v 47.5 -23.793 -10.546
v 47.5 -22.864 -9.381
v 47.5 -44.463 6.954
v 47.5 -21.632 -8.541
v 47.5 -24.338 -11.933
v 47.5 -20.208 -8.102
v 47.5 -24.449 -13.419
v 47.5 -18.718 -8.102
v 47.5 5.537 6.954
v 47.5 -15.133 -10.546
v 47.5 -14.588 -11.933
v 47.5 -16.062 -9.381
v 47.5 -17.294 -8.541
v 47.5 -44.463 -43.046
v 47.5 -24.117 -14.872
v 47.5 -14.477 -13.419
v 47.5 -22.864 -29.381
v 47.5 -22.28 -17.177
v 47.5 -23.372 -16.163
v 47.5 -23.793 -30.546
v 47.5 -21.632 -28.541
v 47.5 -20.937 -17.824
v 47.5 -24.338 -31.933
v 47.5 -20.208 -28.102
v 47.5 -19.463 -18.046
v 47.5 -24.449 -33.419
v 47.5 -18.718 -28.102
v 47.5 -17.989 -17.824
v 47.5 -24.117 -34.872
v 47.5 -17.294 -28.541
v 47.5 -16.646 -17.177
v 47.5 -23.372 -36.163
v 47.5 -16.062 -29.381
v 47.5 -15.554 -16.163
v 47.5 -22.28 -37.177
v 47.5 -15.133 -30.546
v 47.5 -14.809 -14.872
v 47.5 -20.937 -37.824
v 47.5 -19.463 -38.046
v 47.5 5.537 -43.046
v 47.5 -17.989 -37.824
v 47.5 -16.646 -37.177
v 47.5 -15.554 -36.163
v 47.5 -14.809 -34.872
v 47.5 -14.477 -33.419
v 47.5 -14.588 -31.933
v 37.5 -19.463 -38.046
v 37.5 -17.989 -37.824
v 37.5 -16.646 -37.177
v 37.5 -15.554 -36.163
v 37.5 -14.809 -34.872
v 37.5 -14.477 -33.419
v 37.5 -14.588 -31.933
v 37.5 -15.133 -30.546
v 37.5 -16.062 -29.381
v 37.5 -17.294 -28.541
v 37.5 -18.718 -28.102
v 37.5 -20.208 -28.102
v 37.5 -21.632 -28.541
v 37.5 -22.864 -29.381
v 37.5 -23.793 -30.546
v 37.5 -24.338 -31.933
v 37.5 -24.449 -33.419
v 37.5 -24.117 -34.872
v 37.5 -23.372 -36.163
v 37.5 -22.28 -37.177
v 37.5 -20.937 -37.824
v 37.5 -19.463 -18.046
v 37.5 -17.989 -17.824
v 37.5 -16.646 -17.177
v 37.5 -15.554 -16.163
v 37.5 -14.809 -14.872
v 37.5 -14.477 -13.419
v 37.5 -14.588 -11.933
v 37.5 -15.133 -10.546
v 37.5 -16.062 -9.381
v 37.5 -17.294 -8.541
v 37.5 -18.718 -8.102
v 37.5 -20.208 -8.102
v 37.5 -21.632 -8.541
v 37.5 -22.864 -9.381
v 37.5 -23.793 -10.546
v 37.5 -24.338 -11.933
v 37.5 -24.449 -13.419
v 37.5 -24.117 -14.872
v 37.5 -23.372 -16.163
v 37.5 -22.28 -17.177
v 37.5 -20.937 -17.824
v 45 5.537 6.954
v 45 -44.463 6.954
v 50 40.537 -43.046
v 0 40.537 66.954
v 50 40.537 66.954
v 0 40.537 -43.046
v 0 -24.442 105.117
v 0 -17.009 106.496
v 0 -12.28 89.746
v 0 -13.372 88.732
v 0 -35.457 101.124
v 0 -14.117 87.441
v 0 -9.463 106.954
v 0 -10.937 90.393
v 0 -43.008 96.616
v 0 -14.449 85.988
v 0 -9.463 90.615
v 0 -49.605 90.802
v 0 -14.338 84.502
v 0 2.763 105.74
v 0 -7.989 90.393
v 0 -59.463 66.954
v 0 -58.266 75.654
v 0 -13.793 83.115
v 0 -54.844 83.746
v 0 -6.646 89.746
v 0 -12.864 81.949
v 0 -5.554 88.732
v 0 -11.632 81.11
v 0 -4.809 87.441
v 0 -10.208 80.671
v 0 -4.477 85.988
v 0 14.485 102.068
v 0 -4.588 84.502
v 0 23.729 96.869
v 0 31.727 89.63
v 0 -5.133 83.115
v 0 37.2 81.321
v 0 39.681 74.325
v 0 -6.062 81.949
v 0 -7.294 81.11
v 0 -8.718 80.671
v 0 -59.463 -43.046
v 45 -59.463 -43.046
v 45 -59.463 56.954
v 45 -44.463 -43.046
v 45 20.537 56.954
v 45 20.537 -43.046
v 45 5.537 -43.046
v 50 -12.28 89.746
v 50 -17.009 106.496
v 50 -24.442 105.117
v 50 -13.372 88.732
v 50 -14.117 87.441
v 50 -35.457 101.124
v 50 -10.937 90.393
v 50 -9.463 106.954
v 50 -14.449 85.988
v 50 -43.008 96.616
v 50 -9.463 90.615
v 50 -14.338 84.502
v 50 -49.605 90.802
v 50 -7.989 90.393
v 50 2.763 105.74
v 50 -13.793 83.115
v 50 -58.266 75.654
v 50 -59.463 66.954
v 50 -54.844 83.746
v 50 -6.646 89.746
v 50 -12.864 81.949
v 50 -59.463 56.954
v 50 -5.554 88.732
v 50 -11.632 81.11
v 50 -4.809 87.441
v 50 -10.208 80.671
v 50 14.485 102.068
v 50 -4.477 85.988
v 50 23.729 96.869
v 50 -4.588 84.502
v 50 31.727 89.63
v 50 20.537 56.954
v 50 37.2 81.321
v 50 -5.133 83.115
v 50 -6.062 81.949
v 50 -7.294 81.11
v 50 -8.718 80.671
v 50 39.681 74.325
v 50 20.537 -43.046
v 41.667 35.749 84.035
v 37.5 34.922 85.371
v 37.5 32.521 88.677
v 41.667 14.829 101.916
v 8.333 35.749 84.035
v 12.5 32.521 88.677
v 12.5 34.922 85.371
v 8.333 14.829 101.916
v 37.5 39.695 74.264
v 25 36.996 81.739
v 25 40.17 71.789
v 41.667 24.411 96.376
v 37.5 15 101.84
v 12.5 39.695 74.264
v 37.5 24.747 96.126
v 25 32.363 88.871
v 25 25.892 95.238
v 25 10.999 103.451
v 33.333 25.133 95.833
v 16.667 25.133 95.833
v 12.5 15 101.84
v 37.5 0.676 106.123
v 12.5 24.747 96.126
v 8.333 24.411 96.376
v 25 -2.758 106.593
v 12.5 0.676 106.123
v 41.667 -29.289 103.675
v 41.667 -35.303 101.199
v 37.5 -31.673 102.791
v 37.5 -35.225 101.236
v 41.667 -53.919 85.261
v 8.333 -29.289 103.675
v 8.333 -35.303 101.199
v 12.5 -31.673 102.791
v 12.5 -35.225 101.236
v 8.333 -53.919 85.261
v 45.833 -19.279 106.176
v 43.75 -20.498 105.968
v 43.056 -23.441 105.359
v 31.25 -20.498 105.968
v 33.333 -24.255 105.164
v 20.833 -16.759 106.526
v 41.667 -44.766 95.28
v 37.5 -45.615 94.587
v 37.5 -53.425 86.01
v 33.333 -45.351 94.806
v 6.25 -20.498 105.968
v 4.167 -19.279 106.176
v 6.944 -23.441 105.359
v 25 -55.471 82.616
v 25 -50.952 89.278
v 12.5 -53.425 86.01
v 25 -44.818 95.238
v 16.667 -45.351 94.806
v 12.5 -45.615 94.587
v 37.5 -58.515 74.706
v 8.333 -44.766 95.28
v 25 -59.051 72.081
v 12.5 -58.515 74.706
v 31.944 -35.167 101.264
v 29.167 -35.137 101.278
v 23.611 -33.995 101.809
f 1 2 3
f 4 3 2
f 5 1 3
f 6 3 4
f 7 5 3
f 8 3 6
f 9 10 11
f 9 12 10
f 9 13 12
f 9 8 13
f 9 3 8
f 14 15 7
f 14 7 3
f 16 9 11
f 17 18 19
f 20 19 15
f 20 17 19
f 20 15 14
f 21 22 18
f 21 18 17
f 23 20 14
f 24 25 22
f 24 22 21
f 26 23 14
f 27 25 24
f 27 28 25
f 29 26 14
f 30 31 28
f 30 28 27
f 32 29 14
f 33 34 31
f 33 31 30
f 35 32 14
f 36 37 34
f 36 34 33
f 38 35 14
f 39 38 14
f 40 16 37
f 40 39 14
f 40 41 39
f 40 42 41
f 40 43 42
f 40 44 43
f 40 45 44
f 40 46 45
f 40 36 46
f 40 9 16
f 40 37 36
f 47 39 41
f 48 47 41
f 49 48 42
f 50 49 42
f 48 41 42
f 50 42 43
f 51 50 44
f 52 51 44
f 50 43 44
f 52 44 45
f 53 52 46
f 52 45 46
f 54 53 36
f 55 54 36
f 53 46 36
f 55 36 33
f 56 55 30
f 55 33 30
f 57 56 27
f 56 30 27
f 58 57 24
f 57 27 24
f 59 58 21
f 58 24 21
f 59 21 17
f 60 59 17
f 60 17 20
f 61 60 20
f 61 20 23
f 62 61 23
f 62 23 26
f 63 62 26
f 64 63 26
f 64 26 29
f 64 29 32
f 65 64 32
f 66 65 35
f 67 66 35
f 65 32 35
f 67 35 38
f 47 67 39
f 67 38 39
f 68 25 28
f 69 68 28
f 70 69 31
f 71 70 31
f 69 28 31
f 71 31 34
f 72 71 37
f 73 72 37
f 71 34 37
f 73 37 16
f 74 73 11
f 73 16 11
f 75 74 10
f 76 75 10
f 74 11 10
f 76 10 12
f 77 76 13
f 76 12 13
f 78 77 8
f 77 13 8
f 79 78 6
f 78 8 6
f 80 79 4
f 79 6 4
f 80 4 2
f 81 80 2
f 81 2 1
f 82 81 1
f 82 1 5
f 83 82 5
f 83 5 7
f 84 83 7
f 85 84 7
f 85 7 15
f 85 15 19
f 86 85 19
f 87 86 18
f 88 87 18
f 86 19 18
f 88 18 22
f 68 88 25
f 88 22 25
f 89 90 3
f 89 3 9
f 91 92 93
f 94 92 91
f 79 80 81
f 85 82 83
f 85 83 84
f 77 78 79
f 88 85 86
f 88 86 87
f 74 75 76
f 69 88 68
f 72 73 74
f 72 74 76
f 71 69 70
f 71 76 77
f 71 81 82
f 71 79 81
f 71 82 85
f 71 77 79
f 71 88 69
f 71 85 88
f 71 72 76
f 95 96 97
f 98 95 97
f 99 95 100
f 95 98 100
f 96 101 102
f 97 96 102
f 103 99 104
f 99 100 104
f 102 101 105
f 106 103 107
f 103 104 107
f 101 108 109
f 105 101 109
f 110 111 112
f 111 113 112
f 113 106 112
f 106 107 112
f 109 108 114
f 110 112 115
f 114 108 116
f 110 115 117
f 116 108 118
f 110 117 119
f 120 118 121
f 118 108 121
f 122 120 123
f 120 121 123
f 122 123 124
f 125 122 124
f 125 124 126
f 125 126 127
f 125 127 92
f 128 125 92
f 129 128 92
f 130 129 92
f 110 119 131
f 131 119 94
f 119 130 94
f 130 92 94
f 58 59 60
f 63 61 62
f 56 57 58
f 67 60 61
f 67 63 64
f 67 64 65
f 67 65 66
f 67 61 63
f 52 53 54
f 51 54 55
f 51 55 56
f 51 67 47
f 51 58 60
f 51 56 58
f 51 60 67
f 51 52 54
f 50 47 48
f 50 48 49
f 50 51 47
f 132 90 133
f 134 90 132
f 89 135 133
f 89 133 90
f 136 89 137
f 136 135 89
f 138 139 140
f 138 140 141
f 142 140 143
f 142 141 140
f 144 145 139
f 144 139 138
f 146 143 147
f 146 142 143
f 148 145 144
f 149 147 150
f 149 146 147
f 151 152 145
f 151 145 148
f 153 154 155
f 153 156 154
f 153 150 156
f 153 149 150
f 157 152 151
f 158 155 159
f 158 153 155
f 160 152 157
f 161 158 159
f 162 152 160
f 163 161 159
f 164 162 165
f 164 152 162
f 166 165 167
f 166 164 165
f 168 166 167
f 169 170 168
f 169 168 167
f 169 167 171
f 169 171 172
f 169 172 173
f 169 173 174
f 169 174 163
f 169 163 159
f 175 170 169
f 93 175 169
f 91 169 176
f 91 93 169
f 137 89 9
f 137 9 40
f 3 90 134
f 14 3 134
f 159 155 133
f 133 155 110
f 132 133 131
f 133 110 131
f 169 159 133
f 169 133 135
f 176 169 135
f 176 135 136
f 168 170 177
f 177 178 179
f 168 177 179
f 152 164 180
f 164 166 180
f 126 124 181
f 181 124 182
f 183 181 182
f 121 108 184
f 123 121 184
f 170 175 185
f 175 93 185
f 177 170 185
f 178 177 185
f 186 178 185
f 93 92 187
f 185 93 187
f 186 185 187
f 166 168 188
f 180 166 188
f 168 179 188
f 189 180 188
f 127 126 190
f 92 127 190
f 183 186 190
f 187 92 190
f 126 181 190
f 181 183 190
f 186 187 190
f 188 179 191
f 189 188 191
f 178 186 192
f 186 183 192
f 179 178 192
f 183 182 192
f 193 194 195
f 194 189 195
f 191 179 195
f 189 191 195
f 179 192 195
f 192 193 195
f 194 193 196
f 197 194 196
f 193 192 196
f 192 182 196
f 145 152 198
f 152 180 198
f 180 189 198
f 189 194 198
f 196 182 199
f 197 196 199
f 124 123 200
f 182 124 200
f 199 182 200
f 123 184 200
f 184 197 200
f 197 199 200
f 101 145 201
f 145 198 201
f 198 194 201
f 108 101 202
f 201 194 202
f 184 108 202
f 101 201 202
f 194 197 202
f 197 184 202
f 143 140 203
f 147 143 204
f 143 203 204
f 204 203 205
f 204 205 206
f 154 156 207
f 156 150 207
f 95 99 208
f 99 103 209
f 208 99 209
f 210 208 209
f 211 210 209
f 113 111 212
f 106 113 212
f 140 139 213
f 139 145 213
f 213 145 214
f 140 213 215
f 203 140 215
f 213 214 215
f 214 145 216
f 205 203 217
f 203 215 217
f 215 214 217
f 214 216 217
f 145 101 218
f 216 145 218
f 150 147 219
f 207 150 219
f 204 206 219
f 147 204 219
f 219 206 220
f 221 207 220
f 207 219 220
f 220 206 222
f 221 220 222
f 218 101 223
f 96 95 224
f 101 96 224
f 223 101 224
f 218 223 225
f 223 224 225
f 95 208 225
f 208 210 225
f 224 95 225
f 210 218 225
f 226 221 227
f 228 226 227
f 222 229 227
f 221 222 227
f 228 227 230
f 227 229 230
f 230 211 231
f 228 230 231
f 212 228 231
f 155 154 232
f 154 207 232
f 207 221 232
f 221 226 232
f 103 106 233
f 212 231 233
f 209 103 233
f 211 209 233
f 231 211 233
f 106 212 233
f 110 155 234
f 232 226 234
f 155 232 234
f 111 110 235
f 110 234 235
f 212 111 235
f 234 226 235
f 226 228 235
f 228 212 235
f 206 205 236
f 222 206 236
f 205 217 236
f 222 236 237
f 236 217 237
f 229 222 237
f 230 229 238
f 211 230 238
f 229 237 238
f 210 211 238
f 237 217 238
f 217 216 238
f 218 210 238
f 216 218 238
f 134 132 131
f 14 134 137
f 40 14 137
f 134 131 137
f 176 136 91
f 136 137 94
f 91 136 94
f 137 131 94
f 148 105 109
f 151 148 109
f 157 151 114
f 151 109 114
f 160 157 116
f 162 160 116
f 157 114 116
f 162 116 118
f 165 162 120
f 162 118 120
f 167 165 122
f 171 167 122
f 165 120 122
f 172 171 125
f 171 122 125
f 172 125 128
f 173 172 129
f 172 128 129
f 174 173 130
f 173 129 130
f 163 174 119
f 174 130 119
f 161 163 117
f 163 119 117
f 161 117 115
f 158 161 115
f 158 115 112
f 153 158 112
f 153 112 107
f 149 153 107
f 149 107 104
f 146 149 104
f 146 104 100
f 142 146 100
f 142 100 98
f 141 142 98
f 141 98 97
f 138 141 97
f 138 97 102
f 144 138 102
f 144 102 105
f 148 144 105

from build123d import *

# Parameters (mm, degrees)
SKIZZE1_W                       = 150
SKIZZE1_H                       = 100
AUFSATZ_LINEAR_AUSTRAGEN1_DEPTH = 50
SKIZZE2_W                       = 100
SKIZZE2_H                       = 80
SCHNITT_LINEAR_AUSTRAGEN1_DEPTH = 5
SKIZZE3_W                       = 50
SKIZZE3_H                       = 50
AUFSATZ_LINEAR_AUSTRAGEN2_DEPTH = 2.5
SKIZZE4_R                       = 5
SCHNITT_LINEAR_AUSTRAGEN2_DEPTH = 10
VERRUNDUNG1_SIZE                = 50
VERRUNDUNG1_SIZE_2              = 40
SKIZZE5_R                       = 5
SCHNITT_LINEAR_AUSTRAGEN3_DEPTH = 380


with BuildPart() as part:
    # Skizze1 → Aufsatz-Linear austragen1 (new body)
    with BuildSketch(Plane(origin=(0, 0, 0), x_dir=(0, 0, -1), z_dir=(1, 0, 0))):
        with Locations((-31.954225352, -9.463028169)):
            Rectangle(SKIZZE1_W, SKIZZE1_H)
    extrude(amount=AUFSATZ_LINEAR_AUSTRAGEN1_DEPTH)

    # Skizze2 → Schnitt-Linear austragen1 (cut)
    with BuildSketch(Plane(origin=(50, 0, 0), x_dir=(0, 0, -1), z_dir=(1, 0, 0))):
        with Locations((-6.954225352, -19.463028169)):
            Rectangle(SKIZZE2_W, SKIZZE2_H)
    extrude(amount=-SCHNITT_LINEAR_AUSTRAGEN1_DEPTH, mode=Mode.SUBTRACT)

    # Skizze3 → Aufsatz-Linear austragen2 (add)
    with BuildSketch(Plane(origin=(45, 0, 0), x_dir=(0, 0, -1), z_dir=(1, 0, 0))):
        with Locations((18.045774648, -19.463028169)):
            Rectangle(SKIZZE3_W, SKIZZE3_H)
    extrude(amount=AUFSATZ_LINEAR_AUSTRAGEN2_DEPTH)

    # Skizze4 → Schnitt-Linear austragen2 (cut)
    with BuildSketch(Plane(origin=(47.5, 0, 0), x_dir=(0, 0, -1), z_dir=(1, 0, 0))):
        with Locations((33.045774648, -19.463028169)):
            Circle(SKIZZE4_R)
        with Locations((13.045774648, -19.463028169)):
            Circle(SKIZZE4_R)
    extrude(amount=-SCHNITT_LINEAR_AUSTRAGEN2_DEPTH, mode=Mode.SUBTRACT)

    # Verrundung1
    # an asymmetric fillet: 50, 40 mm, written as the material it takes off along each edge
    with BuildSketch(Plane(origin=(-125, -59.463028169, 106.954225352), x_dir=(0, 1, 0), z_dir=(1, 0, 0))) as verrundung1_piece_1:
        with BuildLine():
            Bezier((VERRUNDUNG1_SIZE, 0), (0, 0), (0, -VERRUNDUNG1_SIZE_2), weights=[1, 0.707106781, 1])
            Line((0, -VERRUNDUNG1_SIZE_2), (0, 0))
            Line((0, 0), (VERRUNDUNG1_SIZE, 0))
        make_face()
    extrude(amount=300, mode=Mode.SUBTRACT)
    with BuildSketch(Plane(origin=(-125, 40.536971831, 106.954225352), x_dir=(0, 0, -1), z_dir=(1, 0, 0))) as verrundung1_piece_2:
        with BuildLine():
            Bezier((VERRUNDUNG1_SIZE_2, 0), (0, 0), (0, -VERRUNDUNG1_SIZE), weights=[1, 0.707106781, 1])
            Line((0, -VERRUNDUNG1_SIZE), (0, 0))
            Line((0, 0), (VERRUNDUNG1_SIZE_2, 0))
        make_face()
    extrude(amount=300, mode=Mode.SUBTRACT)

    # Skizze5 → Schnitt-Linear austragen3 (cut)
    with BuildSketch(Plane.ZY):
        with Locations((85.614751131, -9.463028169)):
            Circle(SKIZZE5_R)
    extrude(amount=-SCHNITT_LINEAR_AUSTRAGEN3_DEPTH, mode=Mode.SUBTRACT)


solid = part.part
